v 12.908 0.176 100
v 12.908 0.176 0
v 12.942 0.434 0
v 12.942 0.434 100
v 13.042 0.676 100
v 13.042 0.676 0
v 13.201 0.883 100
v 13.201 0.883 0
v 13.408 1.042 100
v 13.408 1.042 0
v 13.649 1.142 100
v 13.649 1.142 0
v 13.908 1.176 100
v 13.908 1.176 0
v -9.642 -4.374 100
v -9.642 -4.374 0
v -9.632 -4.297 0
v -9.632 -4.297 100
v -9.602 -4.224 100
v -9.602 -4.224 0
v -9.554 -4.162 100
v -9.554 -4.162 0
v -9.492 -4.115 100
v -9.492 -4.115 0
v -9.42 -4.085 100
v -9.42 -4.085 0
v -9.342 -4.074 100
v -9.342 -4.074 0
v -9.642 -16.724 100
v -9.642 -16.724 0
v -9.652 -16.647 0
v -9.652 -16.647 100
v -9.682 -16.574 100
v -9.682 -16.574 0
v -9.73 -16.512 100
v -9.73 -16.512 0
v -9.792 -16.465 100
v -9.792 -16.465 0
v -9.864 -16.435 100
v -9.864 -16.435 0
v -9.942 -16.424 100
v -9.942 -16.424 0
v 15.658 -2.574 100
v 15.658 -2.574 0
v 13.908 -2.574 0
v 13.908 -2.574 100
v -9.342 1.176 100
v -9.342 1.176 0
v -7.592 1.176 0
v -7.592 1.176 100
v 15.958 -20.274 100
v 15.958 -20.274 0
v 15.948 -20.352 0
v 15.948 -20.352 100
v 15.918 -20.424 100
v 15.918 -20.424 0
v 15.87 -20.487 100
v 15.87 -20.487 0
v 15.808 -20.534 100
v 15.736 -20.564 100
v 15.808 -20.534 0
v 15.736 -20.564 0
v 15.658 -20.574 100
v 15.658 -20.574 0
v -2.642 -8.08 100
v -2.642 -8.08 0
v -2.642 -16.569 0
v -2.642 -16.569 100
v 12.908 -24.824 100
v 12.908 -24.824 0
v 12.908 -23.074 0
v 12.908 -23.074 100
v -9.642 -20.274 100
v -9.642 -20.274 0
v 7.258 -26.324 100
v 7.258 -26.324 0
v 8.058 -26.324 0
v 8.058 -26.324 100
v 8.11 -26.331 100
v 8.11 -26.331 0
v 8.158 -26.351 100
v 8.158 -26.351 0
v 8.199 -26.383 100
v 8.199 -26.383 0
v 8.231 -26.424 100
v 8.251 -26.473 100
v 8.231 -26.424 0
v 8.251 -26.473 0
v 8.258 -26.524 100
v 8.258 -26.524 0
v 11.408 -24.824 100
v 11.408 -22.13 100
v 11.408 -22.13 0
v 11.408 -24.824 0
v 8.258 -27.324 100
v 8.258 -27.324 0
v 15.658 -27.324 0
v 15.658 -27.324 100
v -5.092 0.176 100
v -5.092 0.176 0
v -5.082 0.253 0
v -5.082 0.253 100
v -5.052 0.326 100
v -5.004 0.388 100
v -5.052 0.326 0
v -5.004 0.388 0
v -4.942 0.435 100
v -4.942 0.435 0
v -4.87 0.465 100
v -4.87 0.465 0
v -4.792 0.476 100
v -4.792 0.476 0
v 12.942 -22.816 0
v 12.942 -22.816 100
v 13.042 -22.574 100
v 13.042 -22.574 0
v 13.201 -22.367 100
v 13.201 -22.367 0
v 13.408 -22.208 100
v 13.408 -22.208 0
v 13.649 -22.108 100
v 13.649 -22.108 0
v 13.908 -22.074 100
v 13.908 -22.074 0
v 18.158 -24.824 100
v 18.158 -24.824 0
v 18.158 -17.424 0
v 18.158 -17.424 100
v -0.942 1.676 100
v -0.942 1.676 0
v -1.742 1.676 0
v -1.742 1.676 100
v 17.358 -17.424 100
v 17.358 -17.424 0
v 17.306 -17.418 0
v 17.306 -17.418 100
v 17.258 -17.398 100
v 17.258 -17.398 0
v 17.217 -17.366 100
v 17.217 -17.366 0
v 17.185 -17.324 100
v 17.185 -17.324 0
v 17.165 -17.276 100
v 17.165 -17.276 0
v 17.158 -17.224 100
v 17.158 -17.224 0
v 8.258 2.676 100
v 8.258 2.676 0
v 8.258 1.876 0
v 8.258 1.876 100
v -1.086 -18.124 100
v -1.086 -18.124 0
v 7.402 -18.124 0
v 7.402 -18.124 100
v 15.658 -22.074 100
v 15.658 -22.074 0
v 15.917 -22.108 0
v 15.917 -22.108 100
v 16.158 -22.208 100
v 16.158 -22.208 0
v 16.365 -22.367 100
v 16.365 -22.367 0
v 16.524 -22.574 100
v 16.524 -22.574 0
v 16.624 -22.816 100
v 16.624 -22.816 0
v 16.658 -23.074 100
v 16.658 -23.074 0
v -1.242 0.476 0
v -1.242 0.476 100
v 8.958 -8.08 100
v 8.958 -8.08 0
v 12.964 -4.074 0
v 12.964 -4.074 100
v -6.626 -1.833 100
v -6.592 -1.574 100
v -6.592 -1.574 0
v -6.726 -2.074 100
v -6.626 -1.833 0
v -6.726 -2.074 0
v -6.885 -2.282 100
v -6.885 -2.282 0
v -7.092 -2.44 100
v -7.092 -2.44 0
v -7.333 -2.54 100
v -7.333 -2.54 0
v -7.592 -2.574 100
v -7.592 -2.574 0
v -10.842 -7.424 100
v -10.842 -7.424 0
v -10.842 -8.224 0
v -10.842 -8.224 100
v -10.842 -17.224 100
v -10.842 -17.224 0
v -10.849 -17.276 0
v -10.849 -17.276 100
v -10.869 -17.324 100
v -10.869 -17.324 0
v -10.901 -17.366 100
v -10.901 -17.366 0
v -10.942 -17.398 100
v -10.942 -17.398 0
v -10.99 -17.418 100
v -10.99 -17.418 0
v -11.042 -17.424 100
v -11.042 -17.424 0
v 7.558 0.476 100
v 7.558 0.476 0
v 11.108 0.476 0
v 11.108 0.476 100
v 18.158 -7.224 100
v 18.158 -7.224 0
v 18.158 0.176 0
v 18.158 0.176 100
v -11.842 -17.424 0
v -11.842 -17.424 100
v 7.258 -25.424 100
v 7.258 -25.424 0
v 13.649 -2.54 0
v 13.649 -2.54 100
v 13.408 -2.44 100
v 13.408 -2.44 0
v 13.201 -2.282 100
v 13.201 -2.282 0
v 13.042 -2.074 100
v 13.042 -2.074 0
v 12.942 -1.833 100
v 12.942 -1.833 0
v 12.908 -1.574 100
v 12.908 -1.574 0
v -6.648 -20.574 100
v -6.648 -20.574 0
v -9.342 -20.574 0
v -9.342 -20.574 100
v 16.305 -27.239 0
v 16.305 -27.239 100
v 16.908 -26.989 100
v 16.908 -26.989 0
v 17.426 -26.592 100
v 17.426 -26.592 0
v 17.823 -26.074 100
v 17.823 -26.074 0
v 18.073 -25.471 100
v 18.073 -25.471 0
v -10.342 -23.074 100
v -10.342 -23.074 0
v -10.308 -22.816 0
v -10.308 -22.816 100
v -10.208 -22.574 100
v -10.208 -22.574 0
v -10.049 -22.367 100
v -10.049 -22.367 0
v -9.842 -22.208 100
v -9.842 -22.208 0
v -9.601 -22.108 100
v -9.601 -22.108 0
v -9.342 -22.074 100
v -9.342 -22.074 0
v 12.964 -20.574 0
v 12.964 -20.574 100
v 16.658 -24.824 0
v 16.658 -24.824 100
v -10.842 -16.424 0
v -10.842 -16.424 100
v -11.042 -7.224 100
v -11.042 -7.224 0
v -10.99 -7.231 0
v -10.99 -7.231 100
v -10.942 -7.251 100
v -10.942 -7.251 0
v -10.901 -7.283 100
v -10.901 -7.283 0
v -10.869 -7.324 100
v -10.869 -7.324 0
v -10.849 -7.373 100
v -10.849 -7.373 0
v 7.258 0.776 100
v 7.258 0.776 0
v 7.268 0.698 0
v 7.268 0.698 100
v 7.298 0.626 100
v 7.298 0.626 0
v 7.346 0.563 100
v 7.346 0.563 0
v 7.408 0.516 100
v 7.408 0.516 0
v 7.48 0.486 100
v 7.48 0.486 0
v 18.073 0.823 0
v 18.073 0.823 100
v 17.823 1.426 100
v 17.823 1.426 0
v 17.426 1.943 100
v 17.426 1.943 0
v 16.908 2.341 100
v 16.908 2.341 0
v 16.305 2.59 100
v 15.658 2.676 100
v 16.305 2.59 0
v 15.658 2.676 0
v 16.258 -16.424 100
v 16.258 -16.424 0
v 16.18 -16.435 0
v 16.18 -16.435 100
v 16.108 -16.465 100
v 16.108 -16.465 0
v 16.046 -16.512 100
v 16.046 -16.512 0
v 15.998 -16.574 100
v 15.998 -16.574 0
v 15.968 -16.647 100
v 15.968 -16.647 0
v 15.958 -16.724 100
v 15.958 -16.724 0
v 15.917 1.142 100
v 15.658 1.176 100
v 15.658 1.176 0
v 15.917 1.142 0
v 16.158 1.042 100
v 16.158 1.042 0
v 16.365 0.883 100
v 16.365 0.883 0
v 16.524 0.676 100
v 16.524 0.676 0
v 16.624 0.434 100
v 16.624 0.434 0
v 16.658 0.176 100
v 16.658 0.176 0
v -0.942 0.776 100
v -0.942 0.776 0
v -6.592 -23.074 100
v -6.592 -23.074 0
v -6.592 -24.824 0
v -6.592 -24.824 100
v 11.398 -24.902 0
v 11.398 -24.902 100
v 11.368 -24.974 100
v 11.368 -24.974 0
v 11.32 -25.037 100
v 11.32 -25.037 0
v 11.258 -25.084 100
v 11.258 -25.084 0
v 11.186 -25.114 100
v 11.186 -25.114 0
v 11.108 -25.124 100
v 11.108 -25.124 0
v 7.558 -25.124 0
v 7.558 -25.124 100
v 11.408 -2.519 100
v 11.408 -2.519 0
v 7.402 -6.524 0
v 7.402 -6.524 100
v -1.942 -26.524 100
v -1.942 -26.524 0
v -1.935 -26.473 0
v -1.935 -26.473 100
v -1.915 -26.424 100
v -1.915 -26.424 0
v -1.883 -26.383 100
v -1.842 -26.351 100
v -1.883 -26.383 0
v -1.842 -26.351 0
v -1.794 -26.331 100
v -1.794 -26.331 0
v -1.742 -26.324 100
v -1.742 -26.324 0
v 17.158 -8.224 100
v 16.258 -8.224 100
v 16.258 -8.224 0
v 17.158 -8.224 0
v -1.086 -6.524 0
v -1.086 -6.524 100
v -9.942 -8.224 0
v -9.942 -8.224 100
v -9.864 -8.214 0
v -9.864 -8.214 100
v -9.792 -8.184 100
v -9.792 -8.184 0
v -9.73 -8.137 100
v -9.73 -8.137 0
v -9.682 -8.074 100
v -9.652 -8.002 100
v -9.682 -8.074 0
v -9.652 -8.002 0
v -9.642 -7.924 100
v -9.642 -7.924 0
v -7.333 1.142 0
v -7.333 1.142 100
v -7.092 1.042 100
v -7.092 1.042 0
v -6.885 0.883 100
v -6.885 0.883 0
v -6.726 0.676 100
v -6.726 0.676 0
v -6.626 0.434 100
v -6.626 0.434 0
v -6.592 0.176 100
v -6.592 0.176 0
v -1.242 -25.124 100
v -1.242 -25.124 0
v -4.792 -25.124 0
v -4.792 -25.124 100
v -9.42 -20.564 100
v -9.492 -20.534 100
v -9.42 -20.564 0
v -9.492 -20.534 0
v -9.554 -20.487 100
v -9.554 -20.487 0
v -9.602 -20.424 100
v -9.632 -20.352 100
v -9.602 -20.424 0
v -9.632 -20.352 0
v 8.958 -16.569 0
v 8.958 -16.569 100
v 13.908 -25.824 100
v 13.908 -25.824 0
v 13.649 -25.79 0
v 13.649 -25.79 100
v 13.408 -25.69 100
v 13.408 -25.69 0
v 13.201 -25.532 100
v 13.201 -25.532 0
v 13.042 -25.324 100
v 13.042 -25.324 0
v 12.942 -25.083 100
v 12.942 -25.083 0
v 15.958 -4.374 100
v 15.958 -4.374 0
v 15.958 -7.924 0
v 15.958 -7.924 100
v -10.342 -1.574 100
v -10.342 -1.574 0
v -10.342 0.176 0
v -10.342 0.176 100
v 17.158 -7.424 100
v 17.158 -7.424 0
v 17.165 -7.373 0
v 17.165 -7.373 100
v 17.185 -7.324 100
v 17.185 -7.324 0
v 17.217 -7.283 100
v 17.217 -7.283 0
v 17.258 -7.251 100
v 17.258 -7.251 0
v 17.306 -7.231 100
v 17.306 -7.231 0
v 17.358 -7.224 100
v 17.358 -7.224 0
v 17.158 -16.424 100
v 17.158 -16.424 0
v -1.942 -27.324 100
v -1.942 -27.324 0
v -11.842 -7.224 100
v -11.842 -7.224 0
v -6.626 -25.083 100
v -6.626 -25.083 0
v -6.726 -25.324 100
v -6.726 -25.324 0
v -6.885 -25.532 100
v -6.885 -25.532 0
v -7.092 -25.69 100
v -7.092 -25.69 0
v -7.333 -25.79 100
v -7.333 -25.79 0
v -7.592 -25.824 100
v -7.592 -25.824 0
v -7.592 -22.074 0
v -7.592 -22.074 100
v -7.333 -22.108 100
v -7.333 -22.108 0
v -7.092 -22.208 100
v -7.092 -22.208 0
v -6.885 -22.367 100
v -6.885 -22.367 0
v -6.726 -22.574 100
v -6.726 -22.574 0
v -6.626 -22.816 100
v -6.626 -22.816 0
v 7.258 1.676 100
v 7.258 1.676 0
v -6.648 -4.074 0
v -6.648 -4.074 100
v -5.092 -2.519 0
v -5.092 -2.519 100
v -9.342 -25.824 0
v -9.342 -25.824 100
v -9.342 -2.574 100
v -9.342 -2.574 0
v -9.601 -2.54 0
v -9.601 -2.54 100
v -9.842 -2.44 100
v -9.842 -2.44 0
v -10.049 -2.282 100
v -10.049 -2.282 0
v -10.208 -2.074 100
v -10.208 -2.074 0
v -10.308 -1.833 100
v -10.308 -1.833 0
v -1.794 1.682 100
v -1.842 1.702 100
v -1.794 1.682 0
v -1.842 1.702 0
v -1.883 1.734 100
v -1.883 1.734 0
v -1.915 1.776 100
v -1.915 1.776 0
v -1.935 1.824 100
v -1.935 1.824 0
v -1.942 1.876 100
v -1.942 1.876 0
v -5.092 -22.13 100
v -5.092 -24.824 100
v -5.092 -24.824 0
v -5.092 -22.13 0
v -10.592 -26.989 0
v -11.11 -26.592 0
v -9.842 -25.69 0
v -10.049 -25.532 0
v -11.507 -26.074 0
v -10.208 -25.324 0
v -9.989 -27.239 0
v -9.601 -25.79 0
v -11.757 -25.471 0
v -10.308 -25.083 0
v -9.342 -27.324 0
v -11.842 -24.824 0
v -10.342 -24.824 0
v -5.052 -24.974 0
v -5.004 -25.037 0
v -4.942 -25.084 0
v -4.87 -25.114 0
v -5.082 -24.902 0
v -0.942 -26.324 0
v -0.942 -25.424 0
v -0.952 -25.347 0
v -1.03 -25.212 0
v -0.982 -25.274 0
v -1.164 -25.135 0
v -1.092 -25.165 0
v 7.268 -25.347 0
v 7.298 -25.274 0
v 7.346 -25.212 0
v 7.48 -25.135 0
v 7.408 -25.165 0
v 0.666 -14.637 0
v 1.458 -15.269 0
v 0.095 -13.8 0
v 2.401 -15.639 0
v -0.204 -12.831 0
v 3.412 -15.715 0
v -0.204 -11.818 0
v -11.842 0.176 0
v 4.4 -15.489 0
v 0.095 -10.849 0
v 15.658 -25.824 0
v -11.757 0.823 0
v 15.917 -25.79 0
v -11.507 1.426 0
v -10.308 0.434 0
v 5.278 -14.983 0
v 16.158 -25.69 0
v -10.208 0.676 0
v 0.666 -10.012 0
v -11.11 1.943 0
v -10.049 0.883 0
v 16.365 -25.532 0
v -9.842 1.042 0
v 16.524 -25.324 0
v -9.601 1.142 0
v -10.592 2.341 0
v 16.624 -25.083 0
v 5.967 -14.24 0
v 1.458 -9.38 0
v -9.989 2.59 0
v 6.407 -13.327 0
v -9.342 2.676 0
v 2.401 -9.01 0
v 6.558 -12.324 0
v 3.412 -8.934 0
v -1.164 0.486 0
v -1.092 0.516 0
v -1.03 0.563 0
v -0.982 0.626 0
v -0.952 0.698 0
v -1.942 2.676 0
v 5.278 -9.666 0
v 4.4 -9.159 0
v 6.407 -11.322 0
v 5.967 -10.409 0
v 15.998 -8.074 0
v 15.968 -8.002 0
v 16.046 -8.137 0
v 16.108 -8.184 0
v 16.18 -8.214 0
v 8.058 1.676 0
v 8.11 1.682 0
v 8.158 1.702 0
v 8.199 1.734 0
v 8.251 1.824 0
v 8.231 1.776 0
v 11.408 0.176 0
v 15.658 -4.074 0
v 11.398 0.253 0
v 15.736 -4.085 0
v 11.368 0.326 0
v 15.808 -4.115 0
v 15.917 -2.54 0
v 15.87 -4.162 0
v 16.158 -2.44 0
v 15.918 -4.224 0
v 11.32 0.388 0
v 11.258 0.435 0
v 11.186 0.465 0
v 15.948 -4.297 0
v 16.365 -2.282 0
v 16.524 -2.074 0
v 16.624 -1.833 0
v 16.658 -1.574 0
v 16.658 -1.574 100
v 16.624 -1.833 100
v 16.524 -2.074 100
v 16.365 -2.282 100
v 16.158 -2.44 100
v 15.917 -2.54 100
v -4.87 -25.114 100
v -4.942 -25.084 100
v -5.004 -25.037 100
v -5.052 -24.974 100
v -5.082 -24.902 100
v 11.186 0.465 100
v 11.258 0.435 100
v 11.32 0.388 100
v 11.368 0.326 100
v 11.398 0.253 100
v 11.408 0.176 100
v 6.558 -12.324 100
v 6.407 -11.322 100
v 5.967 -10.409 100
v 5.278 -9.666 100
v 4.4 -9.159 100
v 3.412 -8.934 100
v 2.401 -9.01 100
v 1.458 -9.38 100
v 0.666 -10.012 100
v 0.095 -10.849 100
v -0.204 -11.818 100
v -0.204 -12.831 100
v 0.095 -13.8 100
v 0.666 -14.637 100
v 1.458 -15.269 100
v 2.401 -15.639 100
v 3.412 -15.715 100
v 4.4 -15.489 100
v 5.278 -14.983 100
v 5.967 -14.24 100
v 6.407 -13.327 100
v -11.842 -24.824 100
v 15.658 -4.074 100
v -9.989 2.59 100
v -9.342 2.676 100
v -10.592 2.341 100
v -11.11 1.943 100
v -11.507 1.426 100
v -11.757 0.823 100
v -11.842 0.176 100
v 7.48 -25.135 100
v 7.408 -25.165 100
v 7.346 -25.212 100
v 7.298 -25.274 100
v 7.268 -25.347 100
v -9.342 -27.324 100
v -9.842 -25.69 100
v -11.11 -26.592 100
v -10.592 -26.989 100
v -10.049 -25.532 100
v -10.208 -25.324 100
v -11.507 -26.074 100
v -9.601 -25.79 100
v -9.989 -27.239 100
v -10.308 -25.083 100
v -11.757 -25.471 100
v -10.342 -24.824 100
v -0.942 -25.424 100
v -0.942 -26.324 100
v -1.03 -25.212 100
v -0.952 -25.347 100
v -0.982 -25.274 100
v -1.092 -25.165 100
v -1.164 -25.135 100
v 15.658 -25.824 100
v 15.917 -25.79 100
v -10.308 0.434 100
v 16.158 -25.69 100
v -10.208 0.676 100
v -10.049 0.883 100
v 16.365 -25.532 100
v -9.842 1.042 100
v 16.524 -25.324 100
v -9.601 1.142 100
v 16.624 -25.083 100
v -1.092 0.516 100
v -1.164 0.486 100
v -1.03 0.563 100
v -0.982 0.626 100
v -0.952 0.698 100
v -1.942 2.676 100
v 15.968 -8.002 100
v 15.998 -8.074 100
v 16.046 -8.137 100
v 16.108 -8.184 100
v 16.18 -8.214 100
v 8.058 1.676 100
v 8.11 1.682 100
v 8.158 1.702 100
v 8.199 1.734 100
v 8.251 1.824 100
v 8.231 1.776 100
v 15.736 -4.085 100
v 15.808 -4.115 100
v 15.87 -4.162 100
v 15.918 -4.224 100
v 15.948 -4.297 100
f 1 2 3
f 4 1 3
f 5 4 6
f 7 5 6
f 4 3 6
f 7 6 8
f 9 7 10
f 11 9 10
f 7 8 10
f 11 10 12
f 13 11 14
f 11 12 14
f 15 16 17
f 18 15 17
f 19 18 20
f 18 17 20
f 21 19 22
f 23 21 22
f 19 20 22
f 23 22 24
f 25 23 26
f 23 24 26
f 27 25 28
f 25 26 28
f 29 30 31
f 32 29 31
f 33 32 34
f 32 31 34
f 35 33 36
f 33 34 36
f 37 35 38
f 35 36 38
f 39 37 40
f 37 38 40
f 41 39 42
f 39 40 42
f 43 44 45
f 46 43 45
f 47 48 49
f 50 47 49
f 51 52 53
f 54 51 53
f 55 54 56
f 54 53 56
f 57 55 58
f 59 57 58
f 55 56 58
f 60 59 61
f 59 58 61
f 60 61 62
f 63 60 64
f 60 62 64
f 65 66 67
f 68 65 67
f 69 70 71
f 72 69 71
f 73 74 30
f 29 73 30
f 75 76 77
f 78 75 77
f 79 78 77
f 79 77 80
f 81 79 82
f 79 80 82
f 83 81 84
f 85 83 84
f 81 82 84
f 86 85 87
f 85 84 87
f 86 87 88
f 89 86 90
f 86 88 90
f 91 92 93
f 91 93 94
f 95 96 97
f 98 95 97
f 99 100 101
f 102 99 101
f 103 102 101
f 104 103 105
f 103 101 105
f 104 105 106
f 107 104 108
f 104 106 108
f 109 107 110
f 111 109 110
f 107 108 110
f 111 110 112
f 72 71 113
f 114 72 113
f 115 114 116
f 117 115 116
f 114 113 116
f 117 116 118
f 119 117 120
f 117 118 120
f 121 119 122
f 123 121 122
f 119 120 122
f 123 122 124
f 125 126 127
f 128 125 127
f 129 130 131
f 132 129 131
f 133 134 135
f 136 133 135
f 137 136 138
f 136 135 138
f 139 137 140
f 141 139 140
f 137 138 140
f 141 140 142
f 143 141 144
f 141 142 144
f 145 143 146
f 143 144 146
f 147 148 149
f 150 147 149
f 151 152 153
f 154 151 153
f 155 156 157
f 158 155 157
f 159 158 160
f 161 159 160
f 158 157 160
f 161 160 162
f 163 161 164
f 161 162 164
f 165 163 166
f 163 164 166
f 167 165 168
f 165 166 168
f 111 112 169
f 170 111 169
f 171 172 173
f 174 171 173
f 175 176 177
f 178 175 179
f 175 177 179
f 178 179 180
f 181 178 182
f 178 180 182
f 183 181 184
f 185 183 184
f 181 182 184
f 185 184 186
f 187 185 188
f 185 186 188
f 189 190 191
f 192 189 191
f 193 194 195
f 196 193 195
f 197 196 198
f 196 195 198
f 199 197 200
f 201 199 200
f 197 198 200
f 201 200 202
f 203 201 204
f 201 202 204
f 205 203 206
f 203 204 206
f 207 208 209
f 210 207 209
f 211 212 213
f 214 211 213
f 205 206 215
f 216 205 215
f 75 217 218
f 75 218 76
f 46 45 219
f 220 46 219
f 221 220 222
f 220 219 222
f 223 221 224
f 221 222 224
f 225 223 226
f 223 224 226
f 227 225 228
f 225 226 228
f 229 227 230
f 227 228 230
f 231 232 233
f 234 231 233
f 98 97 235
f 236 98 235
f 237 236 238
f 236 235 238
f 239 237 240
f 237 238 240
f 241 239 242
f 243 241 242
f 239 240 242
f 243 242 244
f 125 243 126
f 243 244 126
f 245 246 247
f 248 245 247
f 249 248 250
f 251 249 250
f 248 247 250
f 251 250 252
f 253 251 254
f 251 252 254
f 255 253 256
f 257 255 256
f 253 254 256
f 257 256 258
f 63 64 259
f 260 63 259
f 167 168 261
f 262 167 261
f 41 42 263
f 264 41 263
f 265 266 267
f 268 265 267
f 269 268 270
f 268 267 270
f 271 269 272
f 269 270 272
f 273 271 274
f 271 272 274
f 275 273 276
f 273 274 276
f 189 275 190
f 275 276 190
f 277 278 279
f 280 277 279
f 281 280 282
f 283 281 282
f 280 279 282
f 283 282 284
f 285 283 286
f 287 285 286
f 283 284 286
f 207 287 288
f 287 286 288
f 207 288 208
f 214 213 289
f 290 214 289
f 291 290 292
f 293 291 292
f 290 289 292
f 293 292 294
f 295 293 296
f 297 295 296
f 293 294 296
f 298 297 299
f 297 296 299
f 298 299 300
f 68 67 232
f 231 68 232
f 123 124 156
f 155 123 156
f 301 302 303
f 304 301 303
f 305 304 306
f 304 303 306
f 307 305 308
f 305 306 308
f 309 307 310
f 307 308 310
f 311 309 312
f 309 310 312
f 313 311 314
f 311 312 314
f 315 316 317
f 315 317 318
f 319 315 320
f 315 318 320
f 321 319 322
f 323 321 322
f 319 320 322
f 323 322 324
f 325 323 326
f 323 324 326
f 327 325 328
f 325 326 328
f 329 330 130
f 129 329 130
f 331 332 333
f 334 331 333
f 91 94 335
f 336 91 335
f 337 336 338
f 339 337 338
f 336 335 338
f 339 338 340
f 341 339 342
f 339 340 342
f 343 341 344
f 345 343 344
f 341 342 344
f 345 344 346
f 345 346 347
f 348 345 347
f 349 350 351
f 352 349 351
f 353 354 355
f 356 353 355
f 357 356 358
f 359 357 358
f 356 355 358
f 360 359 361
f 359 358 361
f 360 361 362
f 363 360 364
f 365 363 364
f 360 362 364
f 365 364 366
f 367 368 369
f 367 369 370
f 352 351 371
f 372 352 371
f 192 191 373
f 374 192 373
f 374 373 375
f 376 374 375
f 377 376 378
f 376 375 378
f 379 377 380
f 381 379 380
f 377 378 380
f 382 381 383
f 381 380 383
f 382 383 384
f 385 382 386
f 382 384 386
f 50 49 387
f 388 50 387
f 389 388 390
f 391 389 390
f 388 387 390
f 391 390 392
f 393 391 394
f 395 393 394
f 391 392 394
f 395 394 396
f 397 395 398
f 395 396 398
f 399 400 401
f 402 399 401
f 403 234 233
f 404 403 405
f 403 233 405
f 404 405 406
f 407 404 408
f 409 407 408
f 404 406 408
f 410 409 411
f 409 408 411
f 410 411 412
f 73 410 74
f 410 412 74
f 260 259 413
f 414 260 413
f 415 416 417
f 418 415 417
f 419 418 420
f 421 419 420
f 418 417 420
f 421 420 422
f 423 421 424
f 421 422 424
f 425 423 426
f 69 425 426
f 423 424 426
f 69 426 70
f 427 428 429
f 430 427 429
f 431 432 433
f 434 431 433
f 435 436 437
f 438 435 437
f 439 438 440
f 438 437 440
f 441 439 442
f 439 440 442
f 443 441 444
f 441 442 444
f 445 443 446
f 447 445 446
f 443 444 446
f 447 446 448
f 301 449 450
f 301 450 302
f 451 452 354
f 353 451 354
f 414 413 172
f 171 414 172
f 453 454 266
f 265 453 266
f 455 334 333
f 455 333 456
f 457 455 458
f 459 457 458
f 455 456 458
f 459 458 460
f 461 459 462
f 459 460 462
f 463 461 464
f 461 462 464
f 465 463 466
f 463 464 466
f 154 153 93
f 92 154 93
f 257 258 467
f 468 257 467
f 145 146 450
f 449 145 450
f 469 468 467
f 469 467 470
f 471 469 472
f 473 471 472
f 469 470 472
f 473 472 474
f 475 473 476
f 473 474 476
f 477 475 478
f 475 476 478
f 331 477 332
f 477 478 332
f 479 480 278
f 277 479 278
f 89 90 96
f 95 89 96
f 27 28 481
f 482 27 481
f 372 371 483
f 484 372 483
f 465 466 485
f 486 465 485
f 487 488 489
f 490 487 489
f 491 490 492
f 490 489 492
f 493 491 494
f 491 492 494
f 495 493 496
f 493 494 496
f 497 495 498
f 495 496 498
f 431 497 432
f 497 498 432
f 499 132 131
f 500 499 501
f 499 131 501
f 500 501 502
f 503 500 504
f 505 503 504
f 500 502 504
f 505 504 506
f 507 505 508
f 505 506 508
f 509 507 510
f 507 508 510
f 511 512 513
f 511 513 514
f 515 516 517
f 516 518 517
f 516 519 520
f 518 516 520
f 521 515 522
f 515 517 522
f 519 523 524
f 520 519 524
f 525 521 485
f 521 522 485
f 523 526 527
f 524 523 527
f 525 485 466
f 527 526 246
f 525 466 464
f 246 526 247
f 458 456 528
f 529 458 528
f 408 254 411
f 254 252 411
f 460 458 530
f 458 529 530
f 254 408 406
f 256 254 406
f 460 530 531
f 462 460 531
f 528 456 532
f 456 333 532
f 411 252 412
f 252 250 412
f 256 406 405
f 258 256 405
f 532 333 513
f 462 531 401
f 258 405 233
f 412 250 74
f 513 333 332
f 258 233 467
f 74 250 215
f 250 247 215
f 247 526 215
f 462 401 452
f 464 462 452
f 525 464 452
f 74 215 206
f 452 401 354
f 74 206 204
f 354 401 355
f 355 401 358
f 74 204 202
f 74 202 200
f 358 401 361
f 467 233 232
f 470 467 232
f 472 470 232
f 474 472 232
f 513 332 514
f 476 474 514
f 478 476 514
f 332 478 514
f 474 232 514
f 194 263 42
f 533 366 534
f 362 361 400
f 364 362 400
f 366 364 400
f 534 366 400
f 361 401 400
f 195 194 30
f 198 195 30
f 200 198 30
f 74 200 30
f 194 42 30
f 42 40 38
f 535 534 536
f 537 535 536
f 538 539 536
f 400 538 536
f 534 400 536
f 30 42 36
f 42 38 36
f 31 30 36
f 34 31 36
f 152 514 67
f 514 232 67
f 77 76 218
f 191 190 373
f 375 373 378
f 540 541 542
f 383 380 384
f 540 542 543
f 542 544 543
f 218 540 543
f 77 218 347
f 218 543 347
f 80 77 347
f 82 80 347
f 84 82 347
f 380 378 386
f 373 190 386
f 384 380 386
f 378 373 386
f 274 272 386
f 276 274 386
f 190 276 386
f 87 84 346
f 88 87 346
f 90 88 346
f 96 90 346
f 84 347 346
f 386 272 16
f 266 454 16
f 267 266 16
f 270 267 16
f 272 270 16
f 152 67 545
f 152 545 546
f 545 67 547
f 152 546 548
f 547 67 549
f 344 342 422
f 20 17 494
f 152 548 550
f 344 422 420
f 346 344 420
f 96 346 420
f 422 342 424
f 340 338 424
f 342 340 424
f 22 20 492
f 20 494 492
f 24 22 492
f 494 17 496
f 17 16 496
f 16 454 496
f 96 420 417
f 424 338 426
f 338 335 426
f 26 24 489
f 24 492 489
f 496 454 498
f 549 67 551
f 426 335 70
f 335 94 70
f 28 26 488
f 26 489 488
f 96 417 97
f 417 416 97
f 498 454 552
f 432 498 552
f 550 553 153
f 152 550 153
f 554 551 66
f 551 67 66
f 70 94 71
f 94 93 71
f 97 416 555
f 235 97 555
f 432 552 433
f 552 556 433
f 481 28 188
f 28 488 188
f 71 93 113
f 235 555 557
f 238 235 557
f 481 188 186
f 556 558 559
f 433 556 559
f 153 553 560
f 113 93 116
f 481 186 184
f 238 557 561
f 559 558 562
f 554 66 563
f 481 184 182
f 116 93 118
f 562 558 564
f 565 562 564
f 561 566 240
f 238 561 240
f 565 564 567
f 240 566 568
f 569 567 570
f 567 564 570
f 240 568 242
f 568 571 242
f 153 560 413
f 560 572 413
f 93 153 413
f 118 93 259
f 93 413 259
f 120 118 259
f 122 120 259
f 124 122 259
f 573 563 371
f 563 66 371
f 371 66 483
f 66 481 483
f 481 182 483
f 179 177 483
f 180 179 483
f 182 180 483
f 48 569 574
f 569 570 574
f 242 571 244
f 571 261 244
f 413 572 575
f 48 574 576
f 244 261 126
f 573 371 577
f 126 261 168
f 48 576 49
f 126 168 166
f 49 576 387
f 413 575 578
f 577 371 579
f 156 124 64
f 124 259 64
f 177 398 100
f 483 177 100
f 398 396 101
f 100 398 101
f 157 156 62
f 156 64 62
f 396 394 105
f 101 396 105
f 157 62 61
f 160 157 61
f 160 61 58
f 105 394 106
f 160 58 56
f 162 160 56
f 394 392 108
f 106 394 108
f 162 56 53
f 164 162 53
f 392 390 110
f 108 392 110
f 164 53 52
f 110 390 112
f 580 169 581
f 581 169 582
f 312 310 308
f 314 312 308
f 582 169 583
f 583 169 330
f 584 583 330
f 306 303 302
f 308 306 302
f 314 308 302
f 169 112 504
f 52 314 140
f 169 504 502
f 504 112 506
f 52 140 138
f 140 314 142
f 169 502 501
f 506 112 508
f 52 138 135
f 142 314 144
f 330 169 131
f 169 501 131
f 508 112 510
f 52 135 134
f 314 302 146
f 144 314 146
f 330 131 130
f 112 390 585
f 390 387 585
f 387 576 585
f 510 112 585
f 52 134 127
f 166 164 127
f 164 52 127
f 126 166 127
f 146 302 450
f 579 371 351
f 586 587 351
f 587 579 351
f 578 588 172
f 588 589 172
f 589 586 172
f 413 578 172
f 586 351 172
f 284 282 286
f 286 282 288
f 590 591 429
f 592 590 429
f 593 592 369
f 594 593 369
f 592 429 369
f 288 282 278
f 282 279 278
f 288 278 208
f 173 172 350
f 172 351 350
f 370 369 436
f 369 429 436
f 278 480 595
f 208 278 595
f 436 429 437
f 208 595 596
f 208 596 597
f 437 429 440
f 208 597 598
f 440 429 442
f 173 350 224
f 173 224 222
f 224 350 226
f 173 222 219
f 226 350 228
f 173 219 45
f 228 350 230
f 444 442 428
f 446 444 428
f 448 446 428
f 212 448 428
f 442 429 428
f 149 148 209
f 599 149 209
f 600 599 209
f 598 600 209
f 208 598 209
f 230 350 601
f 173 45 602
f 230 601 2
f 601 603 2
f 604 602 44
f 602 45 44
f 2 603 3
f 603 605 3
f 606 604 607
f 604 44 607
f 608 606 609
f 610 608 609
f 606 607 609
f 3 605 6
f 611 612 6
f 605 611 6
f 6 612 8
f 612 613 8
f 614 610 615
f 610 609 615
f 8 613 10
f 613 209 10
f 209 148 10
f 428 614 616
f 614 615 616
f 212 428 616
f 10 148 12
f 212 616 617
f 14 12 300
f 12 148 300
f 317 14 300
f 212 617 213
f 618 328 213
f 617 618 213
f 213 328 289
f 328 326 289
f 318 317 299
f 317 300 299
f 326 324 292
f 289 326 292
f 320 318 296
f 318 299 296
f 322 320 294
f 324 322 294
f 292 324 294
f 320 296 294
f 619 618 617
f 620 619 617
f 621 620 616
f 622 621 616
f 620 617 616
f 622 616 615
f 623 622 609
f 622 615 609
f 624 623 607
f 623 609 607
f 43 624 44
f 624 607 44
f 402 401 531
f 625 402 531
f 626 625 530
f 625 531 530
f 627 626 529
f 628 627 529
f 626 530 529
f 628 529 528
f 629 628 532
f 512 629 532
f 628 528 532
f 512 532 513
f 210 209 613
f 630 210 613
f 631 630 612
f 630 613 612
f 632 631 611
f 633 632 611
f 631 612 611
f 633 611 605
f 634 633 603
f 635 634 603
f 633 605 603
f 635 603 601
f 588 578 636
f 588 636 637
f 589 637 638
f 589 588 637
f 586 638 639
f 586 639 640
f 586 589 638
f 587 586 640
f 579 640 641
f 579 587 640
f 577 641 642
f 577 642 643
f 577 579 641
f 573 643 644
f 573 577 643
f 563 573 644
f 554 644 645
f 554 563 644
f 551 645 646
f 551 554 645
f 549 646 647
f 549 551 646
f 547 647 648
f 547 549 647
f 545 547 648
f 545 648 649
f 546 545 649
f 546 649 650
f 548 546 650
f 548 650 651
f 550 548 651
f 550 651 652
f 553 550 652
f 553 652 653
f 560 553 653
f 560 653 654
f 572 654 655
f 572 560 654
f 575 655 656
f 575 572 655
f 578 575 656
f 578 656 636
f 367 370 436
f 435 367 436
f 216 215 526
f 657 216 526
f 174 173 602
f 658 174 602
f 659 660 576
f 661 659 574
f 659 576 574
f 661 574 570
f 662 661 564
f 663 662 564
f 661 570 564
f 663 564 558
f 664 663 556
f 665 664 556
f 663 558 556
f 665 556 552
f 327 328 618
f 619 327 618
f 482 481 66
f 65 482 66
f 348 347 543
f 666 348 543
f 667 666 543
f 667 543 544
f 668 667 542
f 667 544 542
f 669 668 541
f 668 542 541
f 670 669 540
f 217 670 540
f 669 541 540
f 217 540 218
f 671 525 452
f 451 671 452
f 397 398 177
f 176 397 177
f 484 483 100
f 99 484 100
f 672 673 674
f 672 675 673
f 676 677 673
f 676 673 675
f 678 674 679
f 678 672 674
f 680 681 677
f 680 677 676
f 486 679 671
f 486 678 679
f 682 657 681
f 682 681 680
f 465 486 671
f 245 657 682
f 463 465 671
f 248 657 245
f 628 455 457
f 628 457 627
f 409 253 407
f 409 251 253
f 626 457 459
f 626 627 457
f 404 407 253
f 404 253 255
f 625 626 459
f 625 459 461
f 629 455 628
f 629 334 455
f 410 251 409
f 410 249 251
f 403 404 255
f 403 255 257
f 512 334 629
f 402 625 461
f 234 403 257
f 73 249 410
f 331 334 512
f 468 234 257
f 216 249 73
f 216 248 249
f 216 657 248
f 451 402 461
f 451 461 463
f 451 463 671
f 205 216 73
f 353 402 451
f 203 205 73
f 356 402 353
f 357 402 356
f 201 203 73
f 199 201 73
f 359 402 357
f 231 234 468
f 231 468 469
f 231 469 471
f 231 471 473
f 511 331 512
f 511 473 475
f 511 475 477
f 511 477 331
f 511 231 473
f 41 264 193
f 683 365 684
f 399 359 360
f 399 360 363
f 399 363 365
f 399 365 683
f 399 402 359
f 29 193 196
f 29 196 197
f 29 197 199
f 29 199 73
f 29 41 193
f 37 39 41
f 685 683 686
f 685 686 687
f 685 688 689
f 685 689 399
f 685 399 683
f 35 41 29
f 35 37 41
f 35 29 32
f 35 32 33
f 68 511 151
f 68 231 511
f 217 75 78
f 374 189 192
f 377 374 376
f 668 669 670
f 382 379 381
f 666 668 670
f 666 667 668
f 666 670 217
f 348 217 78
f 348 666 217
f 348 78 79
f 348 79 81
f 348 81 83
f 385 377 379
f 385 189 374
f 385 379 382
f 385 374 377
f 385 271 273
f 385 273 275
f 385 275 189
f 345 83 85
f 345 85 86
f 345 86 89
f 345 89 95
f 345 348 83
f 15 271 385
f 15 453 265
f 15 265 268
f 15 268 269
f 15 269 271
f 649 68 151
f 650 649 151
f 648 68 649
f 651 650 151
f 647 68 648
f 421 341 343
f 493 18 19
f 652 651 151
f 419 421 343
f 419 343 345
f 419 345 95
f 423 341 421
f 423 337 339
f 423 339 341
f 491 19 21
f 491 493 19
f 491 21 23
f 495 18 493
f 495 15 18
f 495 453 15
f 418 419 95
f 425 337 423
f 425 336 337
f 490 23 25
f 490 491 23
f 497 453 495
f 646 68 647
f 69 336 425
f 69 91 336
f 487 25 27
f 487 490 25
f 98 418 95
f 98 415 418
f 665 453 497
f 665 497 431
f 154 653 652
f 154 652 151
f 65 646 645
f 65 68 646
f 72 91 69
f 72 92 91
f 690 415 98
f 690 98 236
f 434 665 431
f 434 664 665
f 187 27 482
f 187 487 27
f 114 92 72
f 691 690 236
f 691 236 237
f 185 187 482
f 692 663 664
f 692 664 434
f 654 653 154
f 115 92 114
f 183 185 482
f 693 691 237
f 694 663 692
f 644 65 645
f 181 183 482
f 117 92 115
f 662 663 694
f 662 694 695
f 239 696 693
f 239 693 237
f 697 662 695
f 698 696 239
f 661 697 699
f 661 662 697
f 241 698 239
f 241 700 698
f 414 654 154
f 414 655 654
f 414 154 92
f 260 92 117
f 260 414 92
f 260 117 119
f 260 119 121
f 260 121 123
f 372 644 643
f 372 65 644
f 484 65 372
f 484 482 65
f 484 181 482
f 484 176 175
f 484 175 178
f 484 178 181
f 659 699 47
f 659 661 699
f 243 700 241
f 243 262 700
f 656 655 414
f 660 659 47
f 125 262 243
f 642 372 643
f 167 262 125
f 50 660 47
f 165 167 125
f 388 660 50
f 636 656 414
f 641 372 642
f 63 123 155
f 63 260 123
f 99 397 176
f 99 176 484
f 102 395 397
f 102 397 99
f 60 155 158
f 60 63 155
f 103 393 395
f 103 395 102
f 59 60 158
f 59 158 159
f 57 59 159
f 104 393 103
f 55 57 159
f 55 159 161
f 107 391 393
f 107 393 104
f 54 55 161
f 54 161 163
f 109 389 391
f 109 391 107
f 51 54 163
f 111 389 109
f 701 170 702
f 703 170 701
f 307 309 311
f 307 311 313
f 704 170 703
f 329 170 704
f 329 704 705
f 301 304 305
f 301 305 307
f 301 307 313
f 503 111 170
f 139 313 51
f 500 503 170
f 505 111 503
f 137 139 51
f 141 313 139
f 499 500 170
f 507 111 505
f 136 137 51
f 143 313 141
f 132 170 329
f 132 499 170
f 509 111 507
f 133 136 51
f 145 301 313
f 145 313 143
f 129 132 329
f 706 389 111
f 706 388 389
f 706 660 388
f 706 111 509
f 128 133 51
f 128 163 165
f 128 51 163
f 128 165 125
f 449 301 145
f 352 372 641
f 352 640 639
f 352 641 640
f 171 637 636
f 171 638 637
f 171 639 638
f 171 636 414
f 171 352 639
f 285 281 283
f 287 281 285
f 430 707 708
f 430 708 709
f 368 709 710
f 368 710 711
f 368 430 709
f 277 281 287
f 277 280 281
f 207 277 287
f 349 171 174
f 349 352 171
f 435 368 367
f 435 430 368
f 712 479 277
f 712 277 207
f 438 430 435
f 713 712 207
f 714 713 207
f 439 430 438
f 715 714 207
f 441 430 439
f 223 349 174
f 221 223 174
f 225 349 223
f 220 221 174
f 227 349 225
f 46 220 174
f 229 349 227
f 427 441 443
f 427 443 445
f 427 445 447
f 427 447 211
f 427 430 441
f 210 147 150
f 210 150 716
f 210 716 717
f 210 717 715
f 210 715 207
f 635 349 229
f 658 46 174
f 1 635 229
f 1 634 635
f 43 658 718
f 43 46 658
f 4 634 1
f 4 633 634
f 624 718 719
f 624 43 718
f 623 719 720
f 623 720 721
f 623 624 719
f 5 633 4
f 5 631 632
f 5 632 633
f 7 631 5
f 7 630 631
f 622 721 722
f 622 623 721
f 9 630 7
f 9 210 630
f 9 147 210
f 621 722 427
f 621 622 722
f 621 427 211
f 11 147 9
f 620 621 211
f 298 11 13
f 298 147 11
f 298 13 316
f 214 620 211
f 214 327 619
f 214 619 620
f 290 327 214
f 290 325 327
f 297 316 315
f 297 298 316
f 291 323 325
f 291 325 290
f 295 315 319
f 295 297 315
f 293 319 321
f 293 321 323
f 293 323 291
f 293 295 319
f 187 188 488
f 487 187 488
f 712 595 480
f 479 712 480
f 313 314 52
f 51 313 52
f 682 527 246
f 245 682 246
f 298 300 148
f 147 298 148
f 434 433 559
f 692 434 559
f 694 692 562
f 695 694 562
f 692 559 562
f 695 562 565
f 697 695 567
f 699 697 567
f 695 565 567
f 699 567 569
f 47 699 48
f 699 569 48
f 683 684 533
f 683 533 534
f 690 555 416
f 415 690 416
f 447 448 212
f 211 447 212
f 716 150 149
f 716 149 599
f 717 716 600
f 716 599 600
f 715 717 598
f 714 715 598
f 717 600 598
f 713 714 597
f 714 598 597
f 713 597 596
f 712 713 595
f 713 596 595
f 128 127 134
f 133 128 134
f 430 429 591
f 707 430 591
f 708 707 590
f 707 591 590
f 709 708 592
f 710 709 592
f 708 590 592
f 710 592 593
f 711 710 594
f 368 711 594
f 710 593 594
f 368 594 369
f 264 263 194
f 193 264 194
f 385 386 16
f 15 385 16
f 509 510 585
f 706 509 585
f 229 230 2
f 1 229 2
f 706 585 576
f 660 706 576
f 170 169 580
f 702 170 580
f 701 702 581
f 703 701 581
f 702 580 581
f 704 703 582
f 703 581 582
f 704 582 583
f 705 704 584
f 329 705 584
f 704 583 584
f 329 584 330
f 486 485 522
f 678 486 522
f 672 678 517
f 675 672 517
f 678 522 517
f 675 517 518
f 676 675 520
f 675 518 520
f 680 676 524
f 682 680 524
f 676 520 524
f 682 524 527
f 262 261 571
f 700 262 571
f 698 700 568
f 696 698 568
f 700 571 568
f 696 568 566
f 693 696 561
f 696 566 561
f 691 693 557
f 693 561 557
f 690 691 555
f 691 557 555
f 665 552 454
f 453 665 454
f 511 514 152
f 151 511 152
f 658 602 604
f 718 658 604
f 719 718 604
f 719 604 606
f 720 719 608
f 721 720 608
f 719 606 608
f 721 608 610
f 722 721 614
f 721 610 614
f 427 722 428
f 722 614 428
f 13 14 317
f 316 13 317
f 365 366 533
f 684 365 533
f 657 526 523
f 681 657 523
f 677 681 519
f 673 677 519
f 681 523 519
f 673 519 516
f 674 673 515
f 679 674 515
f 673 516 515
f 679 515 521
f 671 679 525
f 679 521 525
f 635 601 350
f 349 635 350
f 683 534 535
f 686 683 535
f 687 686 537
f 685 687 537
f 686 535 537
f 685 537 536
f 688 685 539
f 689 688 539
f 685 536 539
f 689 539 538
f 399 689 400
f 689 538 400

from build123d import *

# Parameters (mm, degrees)
SKETCH_1_R      = 3.4
EXTRUDE_1_DEPTH = 100


with BuildPart() as part:
    # 草图1 → 凸台-拉伸1 (new body)
    with BuildSketch(Plane.XY):
        with BuildLine():
            Line((8.957955872, -8.080050324), (12.963590791, -4.074415406))
            Line((12.963590791, -4.074415406), (15.657955872, -4.074415406))
            ThreePointArc((15.657955872, -4.074415406), (15.870087906, -4.162283371), (15.957955872, -4.374415406))
            Line((15.957955872, -4.374415406), (15.957955872, -7.924415406))
            ThreePointArc((15.957955872, -7.924415406), (16.045823838, -8.13654744), (16.257955872, -8.224415406))
            Line((16.257955872, -8.224415406), (17.157955872, -8.224415406))
            Line((17.157955872, -8.224415406), (17.157955872, -7.424415406))
            ThreePointArc((17.157955872, -7.424415406), (17.216534516, -7.28299405), (17.357955872, -7.224415406))
            Line((17.357955872, -7.224415406), (18.157955872, -7.224415406))
            Line((18.157955872, -7.224415406), (18.157955872, 0.175584594))
            ThreePointArc((18.157955872, 0.175584594), (17.425722825, 1.943351547), (15.657955872, 2.675584594))
            Line((15.657955872, 2.675584594), (8.257955872, 2.675584594))
            Line((8.257955872, 2.675584594), (8.257955872, 1.875584594))
            ThreePointArc((8.257955872, 1.875584594), (8.199377228, 1.734163238), (8.057955872, 1.675584594))
            Line((8.057955872, 1.675584594), (7.257955872, 1.675584594))
            Line((7.257955872, 1.675584594), (7.257955872, 0.775584594))
            ThreePointArc((7.257955872, 0.775584594), (7.345823838, 0.56345256), (7.557955872, 0.475584594))
            Line((7.557955872, 0.475584594), (11.107955872, 0.475584594))
            ThreePointArc((11.107955872, 0.475584594), (11.320087906, 0.387716629), (11.407955872, 0.175584594))
            Line((11.407955872, 0.175584594), (11.407955872, -2.518780487))
            Line((11.407955872, -2.518780487), (7.402320953, -6.524415406))
            Line((7.402320953, -6.524415406), (-1.086409209, -6.524415406))
            Line((-1.086409209, -6.524415406), (-5.092044128, -2.518780487))
            Line((-5.092044128, -2.518780487), (-5.092044128, 0.175584594))
            ThreePointArc((-5.092044128, 0.175584594), (-5.004176162, 0.387716629), (-4.792044128, 0.475584594))
            Line((-4.792044128, 0.475584594), (-1.242044128, 0.475584594))
            ThreePointArc((-1.242044128, 0.475584594), (-1.029912094, 0.56345256), (-0.942044128, 0.775584594))
            Line((-0.942044128, 0.775584594), (-0.942044128, 1.675584594))
            Line((-0.942044128, 1.675584594), (-1.742044128, 1.675584594))
            ThreePointArc((-1.742044128, 1.675584594), (-1.883465484, 1.734163238), (-1.942044128, 1.875584594))
            Line((-1.942044128, 1.875584594), (-1.942044128, 2.675584594))
            Line((-1.942044128, 2.675584594), (-9.342044128, 2.675584594))
            ThreePointArc((-9.342044128, 2.675584594), (-11.109811081, 1.943351547), (-11.842044128, 0.175584594))
            Line((-11.842044128, 0.175584594), (-11.842044128, -7.224415406))
            Line((-11.842044128, -7.224415406), (-11.042044128, -7.224415406))
            ThreePointArc((-11.042044128, -7.224415406), (-10.900622772, -7.28299405), (-10.842044128, -7.424415406))
            Line((-10.842044128, -7.424415406), (-10.842044128, -8.224415406))
            Line((-10.842044128, -8.224415406), (-9.942044128, -8.224415406))
            ThreePointArc((-9.942044128, -8.224415406), (-9.729912094, -8.13654744), (-9.642044128, -7.924415406))
            Line((-9.642044128, -7.924415406), (-9.642044128, -4.374415406))
            ThreePointArc((-9.642044128, -4.374415406), (-9.554176162, -4.162283371), (-9.342044128, -4.074415406))
            Line((-9.342044128, -4.074415406), (-6.647679047, -4.074415406))
            Line((-6.647679047, -4.074415406), (-2.642044128, -8.080050324))
            Line((-2.642044128, -8.080050324), (-2.642044128, -16.568780487))
            Line((-2.642044128, -16.568780487), (-6.647679047, -20.574415406))
            Line((-6.647679047, -20.574415406), (-9.342044128, -20.574415406))
            ThreePointArc((-9.342044128, -20.574415406), (-9.554176162, -20.48654744), (-9.642044128, -20.274415406))
            Line((-9.642044128, -20.274415406), (-9.642044128, -16.724415406))
            ThreePointArc((-9.642044128, -16.724415406), (-9.729912094, -16.512283371), (-9.942044128, -16.424415406))
            Line((-9.942044128, -16.424415406), (-10.842044128, -16.424415406))
            Line((-10.842044128, -16.424415406), (-10.842044128, -17.224415406))
            ThreePointArc((-10.842044128, -17.224415406), (-10.900622772, -17.365836762), (-11.042044128, -17.424415406))
            Line((-11.042044128, -17.424415406), (-11.842044128, -17.424415406))
            Line((-11.842044128, -17.424415406), (-11.842044128, -24.824415406))
            ThreePointArc((-11.842044128, -24.824415406), (-11.109811081, -26.592182359), (-9.342044128, -27.324415406))
            Line((-9.342044128, -27.324415406), (-1.942044128, -27.324415406))
            Line((-1.942044128, -27.324415406), (-1.942044128, -26.524415406))
            ThreePointArc((-1.942044128, -26.524415406), (-1.883465484, -26.38299405), (-1.742044128, -26.324415406))
            Line((-1.742044128, -26.324415406), (-0.942044128, -26.324415406))
            Line((-0.942044128, -26.324415406), (-0.942044128, -25.424415406))
            ThreePointArc((-0.942044128, -25.424415406), (-1.029912094, -25.212283371), (-1.242044128, -25.124415406))
            Line((-1.242044128, -25.124415406), (-4.792044128, -25.124415406))
            ThreePointArc((-4.792044128, -25.124415406), (-5.004176162, -25.03654744), (-5.092044128, -24.824415406))
            Line((-5.092044128, -24.824415406), (-5.092044128, -22.130050324))
            Line((-5.092044128, -22.130050324), (-1.086409209, -18.124415406))
            Line((-1.086409209, -18.124415406), (7.402320953, -18.124415406))
            Line((7.402320953, -18.124415406), (11.407955872, -22.130050324))
            Line((11.407955872, -22.130050324), (11.407955872, -24.824415406))
            ThreePointArc((11.407955872, -24.824415406), (11.320087906, -25.03654744), (11.107955872, -25.124415406))
            Line((11.107955872, -25.124415406), (7.557955872, -25.124415406))
            ThreePointArc((7.557955872, -25.124415406), (7.345823838, -25.212283371), (7.257955872, -25.424415406))
            Line((7.257955872, -25.424415406), (7.257955872, -26.324415406))
            Line((7.257955872, -26.324415406), (8.057955872, -26.324415406))
            ThreePointArc((8.057955872, -26.324415406), (8.199377228, -26.38299405), (8.257955872, -26.524415406))
            Line((8.257955872, -26.524415406), (8.257955872, -27.324415406))
            Line((8.257955872, -27.324415406), (15.657955872, -27.324415406))
            ThreePointArc((15.657955872, -27.324415406), (17.425722825, -26.592182359), (18.157955872, -24.824415406))
            Line((18.157955872, -24.824415406), (18.157955872, -17.424415406))
            Line((18.157955872, -17.424415406), (17.357955872, -17.424415406))
            ThreePointArc((17.357955872, -17.424415406), (17.216534516, -17.365836762), (17.157955872, -17.224415406))
            Line((17.157955872, -17.224415406), (17.157955872, -16.424415406))
            Line((17.157955872, -16.424415406), (16.257955872, -16.424415406))
            ThreePointArc((16.257955872, -16.424415406), (16.045823838, -16.512283371), (15.957955872, -16.724415406))
            Line((15.957955872, -16.724415406), (15.957955872, -20.274415406))
            ThreePointArc((15.957955872, -20.274415406), (15.870087906, -20.48654744), (15.657955872, -20.574415406))
            Line((15.657955872, -20.574415406), (12.963590791, -20.574415406))
            Line((12.963590791, -20.574415406), (8.957955872, -16.568780487))
            Line((8.957955872, -16.568780487), (8.957955872, -8.080050324))
        make_face()
        with Locations((3.157955872, -12.324415406)):
            Circle(SKETCH_1_R, mode=Mode.SUBTRACT)
        with BuildLine():
            Line((13.907955872, -22.074415406), (15.657955872, -22.074415406))
            ThreePointArc((15.657955872, -22.074415406), (16.365062653, -22.367308625), (16.657955872, -23.074415406))
            Line((16.657955872, -23.074415406), (16.657955872, -24.824415406))
            ThreePointArc((16.657955872, -24.824415406), (16.365062653, -25.531522187), (15.657955872, -25.824415406))
            Line((15.657955872, -25.824415406), (13.907955872, -25.824415406))
            ThreePointArc((13.907955872, -25.824415406), (13.200849091, -25.531522187), (12.907955872, -24.824415406))
            Line((12.907955872, -24.824415406), (12.907955872, -23.074415406))
            ThreePointArc((12.907955872, -23.074415406), (13.200849091, -22.367308625), (13.907955872, -22.074415406))
        make_face(mode=Mode.SUBTRACT)
        with BuildLine():
            Line((12.907955872, -1.574415406), (12.907955872, 0.175584594))
            ThreePointArc((12.907955872, 0.175584594), (13.200849091, 0.882691375), (13.907955872, 1.175584594))
            Line((13.907955872, 1.175584594), (15.657955872, 1.175584594))
            ThreePointArc((15.657955872, 1.175584594), (16.365062653, 0.882691375), (16.657955872, 0.175584594))
            Line((16.657955872, 0.175584594), (16.657955872, -1.574415406))
            ThreePointArc((16.657955872, -1.574415406), (16.365062653, -2.281522187), (15.657955872, -2.574415406))
            Line((15.657955872, -2.574415406), (13.907955872, -2.574415406))
            ThreePointArc((13.907955872, -2.574415406), (13.200849091, -2.281522187), (12.907955872, -1.574415406))
        make_face(mode=Mode.SUBTRACT)
        with BuildLine():
            Line((-6.592044128, -23.074415406), (-6.592044128, -24.824415406))
            ThreePointArc((-6.592044128, -24.824415406), (-6.884937347, -25.531522187), (-7.592044128, -25.824415406))
            Line((-7.592044128, -25.824415406), (-9.342044128, -25.824415406))
            ThreePointArc((-9.342044128, -25.824415406), (-10.049150909, -25.531522187), (-10.342044128, -24.824415406))
            Line((-10.342044128, -24.824415406), (-10.342044128, -23.074415406))
            ThreePointArc((-10.342044128, -23.074415406), (-10.049150909, -22.367308625), (-9.342044128, -22.074415406))
            Line((-9.342044128, -22.074415406), (-7.592044128, -22.074415406))
            ThreePointArc((-7.592044128, -22.074415406), (-6.884937347, -22.367308625), (-6.592044128, -23.074415406))
        make_face(mode=Mode.SUBTRACT)
        with BuildLine():
            Line((-7.592044128, -2.574415406), (-9.342044128, -2.574415406))
            ThreePointArc((-9.342044128, -2.574415406), (-10.049150909, -2.281522187), (-10.342044128, -1.574415406))
            Line((-10.342044128, -1.574415406), (-10.342044128, 0.175584594))
            ThreePointArc((-10.342044128, 0.175584594), (-10.049150909, 0.882691375), (-9.342044128, 1.175584594))
            Line((-9.342044128, 1.175584594), (-7.592044128, 1.175584594))
            ThreePointArc((-7.592044128, 1.175584594), (-6.884937347, 0.882691375), (-6.592044128, 0.175584594))
            Line((-6.592044128, 0.175584594), (-6.592044128, -1.574415406))
            ThreePointArc((-6.592044128, -1.574415406), (-6.884937347, -2.281522187), (-7.592044128, -2.574415406))
        make_face(mode=Mode.SUBTRACT)
    extrude(amount=EXTRUDE_1_DEPTH)


solid = part.part
